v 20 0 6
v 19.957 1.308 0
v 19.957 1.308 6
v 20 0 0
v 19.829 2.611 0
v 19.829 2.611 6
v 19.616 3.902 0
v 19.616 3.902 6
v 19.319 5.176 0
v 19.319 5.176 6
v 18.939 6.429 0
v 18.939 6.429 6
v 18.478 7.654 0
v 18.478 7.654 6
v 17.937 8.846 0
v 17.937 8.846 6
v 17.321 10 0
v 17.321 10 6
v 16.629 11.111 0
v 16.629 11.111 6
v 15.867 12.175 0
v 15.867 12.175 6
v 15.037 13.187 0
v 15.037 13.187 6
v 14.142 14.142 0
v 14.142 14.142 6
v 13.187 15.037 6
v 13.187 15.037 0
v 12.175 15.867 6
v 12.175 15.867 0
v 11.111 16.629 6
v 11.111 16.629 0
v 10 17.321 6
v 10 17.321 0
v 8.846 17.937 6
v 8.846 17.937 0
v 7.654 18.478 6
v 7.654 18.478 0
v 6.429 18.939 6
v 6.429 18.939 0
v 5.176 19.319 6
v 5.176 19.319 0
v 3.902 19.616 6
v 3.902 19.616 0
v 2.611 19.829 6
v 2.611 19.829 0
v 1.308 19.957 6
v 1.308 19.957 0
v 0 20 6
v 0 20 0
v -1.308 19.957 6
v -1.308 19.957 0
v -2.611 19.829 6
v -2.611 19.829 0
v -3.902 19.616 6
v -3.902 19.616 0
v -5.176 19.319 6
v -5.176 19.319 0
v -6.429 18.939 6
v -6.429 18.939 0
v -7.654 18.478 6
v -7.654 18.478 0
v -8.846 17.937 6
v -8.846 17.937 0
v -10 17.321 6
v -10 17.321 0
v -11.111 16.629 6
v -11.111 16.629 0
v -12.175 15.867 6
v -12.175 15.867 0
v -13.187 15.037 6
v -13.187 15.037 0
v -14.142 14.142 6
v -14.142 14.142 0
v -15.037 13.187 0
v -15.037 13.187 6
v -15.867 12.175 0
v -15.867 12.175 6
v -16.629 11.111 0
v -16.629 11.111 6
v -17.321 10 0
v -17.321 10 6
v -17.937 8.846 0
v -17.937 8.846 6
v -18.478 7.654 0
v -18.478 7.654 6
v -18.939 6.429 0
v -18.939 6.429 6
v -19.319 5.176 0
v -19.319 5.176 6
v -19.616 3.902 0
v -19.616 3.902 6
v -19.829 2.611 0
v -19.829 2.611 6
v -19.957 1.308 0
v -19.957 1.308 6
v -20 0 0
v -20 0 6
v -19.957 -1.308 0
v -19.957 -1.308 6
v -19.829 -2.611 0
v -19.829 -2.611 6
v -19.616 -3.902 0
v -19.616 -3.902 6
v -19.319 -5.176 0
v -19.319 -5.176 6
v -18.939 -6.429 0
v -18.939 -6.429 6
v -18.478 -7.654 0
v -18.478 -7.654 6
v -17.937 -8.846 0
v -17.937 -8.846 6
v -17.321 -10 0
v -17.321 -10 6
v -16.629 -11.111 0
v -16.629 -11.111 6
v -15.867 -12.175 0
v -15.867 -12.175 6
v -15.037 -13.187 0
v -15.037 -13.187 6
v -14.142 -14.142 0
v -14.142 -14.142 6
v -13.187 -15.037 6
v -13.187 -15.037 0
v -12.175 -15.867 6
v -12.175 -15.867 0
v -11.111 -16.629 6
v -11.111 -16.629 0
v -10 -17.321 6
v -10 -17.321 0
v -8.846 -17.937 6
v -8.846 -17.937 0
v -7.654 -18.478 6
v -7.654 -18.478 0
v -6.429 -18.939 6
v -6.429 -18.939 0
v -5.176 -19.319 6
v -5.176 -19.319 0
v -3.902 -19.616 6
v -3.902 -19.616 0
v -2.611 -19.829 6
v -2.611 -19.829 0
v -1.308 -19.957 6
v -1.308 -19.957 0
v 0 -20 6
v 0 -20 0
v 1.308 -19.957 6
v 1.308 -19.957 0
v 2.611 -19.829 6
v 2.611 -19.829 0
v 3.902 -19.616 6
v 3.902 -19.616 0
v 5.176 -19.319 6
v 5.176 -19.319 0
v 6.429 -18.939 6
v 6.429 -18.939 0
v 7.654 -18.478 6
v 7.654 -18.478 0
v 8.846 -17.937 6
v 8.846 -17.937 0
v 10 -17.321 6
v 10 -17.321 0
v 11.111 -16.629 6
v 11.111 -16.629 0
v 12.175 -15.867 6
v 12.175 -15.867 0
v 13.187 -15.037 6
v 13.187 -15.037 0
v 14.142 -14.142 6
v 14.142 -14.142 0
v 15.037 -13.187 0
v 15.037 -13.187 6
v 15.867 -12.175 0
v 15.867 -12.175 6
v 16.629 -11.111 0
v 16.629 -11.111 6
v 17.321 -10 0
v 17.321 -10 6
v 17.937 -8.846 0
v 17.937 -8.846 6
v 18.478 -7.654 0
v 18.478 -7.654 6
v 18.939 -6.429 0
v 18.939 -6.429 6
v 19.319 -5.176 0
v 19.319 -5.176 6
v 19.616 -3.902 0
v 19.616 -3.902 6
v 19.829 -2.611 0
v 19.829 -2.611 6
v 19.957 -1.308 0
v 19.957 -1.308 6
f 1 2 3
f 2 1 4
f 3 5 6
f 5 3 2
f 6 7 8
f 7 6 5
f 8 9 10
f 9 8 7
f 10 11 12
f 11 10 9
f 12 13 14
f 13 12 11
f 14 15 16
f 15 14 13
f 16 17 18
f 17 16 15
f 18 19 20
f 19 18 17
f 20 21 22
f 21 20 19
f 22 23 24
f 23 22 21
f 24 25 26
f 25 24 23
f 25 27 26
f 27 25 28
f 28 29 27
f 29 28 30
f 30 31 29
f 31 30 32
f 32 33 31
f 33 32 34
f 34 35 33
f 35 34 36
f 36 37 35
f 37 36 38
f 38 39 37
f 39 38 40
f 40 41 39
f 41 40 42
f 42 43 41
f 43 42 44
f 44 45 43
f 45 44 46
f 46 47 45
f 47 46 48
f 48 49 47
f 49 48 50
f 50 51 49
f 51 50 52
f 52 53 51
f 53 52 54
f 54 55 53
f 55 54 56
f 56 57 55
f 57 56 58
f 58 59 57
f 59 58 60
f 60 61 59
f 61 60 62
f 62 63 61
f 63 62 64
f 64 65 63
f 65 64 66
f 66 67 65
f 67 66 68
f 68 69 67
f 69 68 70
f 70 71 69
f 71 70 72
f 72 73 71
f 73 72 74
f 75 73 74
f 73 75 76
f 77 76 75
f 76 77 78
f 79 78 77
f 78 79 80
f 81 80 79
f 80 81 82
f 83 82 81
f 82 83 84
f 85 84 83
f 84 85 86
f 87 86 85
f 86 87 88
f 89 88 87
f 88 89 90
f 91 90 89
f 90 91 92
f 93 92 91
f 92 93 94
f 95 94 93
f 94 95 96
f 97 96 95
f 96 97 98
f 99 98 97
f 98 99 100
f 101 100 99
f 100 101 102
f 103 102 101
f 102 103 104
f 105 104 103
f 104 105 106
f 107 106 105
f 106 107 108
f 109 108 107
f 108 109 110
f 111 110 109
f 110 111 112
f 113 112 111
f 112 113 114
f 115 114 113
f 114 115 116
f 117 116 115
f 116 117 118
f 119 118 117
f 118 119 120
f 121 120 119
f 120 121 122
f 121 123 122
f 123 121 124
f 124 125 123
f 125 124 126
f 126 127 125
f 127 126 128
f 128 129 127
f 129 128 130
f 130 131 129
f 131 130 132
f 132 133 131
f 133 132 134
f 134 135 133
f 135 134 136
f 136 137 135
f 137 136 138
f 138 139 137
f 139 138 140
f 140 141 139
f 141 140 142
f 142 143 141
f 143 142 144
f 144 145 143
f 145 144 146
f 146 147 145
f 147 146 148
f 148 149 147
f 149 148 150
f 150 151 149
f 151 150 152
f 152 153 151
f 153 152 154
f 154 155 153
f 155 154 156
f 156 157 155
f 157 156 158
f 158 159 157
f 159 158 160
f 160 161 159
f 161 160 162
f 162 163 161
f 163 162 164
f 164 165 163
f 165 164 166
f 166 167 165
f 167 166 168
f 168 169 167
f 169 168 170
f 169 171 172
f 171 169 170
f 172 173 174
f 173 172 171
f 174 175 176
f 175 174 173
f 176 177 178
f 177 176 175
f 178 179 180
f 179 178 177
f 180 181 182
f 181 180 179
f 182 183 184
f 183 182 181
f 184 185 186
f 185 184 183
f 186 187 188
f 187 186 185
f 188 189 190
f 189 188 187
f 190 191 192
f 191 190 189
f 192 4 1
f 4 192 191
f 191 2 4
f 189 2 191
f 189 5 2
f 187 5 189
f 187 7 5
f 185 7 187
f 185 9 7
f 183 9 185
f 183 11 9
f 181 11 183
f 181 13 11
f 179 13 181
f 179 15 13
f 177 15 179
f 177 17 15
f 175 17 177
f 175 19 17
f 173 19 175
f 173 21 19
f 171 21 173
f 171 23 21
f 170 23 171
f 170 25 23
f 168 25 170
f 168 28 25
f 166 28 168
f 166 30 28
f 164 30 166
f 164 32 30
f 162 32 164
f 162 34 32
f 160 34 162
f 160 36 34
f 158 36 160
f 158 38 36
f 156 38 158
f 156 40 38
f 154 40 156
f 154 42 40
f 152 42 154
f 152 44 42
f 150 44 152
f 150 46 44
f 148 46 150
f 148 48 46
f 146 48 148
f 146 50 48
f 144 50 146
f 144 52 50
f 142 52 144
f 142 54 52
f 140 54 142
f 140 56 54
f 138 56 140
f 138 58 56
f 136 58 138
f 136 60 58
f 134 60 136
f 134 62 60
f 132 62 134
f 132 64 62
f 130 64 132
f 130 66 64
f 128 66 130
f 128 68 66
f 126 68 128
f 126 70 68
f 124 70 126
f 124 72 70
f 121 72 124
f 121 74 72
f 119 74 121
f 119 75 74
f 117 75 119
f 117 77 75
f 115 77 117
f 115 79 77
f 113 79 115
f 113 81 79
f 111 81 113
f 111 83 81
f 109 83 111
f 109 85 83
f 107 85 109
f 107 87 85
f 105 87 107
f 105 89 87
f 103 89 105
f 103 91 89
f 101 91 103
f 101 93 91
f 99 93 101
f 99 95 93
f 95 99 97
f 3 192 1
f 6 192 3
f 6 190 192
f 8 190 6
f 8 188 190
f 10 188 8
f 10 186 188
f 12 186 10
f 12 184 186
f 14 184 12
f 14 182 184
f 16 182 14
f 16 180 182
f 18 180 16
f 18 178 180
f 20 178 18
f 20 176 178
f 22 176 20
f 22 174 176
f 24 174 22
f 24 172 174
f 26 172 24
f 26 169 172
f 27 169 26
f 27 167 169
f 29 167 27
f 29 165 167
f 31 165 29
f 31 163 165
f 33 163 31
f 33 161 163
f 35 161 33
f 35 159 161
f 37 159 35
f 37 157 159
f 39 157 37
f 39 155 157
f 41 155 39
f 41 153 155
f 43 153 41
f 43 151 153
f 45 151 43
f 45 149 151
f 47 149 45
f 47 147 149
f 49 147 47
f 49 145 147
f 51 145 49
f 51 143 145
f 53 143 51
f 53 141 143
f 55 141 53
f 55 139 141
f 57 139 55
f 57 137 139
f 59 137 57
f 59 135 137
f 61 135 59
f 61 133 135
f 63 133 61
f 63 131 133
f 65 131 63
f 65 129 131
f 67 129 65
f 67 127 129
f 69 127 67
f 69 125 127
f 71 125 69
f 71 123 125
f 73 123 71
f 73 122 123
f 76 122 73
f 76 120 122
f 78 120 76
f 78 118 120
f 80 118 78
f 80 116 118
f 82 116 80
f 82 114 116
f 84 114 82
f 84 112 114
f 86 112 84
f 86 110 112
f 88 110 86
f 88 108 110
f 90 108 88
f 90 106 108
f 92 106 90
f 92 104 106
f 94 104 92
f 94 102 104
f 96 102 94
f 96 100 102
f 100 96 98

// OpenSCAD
// Auto-generated from tests/data/feature_fixtures_manifest.json
// fixture: cylinder_short_disk
// fixture_type: cylinder
// description: Short wide cylinder (disk form factor) to stress the plate/cylinder boundary.
$fn = 96;

diameter = 40.000000;
height = 6.000000;

cylinder(h=height, d=diameter, center=false);
